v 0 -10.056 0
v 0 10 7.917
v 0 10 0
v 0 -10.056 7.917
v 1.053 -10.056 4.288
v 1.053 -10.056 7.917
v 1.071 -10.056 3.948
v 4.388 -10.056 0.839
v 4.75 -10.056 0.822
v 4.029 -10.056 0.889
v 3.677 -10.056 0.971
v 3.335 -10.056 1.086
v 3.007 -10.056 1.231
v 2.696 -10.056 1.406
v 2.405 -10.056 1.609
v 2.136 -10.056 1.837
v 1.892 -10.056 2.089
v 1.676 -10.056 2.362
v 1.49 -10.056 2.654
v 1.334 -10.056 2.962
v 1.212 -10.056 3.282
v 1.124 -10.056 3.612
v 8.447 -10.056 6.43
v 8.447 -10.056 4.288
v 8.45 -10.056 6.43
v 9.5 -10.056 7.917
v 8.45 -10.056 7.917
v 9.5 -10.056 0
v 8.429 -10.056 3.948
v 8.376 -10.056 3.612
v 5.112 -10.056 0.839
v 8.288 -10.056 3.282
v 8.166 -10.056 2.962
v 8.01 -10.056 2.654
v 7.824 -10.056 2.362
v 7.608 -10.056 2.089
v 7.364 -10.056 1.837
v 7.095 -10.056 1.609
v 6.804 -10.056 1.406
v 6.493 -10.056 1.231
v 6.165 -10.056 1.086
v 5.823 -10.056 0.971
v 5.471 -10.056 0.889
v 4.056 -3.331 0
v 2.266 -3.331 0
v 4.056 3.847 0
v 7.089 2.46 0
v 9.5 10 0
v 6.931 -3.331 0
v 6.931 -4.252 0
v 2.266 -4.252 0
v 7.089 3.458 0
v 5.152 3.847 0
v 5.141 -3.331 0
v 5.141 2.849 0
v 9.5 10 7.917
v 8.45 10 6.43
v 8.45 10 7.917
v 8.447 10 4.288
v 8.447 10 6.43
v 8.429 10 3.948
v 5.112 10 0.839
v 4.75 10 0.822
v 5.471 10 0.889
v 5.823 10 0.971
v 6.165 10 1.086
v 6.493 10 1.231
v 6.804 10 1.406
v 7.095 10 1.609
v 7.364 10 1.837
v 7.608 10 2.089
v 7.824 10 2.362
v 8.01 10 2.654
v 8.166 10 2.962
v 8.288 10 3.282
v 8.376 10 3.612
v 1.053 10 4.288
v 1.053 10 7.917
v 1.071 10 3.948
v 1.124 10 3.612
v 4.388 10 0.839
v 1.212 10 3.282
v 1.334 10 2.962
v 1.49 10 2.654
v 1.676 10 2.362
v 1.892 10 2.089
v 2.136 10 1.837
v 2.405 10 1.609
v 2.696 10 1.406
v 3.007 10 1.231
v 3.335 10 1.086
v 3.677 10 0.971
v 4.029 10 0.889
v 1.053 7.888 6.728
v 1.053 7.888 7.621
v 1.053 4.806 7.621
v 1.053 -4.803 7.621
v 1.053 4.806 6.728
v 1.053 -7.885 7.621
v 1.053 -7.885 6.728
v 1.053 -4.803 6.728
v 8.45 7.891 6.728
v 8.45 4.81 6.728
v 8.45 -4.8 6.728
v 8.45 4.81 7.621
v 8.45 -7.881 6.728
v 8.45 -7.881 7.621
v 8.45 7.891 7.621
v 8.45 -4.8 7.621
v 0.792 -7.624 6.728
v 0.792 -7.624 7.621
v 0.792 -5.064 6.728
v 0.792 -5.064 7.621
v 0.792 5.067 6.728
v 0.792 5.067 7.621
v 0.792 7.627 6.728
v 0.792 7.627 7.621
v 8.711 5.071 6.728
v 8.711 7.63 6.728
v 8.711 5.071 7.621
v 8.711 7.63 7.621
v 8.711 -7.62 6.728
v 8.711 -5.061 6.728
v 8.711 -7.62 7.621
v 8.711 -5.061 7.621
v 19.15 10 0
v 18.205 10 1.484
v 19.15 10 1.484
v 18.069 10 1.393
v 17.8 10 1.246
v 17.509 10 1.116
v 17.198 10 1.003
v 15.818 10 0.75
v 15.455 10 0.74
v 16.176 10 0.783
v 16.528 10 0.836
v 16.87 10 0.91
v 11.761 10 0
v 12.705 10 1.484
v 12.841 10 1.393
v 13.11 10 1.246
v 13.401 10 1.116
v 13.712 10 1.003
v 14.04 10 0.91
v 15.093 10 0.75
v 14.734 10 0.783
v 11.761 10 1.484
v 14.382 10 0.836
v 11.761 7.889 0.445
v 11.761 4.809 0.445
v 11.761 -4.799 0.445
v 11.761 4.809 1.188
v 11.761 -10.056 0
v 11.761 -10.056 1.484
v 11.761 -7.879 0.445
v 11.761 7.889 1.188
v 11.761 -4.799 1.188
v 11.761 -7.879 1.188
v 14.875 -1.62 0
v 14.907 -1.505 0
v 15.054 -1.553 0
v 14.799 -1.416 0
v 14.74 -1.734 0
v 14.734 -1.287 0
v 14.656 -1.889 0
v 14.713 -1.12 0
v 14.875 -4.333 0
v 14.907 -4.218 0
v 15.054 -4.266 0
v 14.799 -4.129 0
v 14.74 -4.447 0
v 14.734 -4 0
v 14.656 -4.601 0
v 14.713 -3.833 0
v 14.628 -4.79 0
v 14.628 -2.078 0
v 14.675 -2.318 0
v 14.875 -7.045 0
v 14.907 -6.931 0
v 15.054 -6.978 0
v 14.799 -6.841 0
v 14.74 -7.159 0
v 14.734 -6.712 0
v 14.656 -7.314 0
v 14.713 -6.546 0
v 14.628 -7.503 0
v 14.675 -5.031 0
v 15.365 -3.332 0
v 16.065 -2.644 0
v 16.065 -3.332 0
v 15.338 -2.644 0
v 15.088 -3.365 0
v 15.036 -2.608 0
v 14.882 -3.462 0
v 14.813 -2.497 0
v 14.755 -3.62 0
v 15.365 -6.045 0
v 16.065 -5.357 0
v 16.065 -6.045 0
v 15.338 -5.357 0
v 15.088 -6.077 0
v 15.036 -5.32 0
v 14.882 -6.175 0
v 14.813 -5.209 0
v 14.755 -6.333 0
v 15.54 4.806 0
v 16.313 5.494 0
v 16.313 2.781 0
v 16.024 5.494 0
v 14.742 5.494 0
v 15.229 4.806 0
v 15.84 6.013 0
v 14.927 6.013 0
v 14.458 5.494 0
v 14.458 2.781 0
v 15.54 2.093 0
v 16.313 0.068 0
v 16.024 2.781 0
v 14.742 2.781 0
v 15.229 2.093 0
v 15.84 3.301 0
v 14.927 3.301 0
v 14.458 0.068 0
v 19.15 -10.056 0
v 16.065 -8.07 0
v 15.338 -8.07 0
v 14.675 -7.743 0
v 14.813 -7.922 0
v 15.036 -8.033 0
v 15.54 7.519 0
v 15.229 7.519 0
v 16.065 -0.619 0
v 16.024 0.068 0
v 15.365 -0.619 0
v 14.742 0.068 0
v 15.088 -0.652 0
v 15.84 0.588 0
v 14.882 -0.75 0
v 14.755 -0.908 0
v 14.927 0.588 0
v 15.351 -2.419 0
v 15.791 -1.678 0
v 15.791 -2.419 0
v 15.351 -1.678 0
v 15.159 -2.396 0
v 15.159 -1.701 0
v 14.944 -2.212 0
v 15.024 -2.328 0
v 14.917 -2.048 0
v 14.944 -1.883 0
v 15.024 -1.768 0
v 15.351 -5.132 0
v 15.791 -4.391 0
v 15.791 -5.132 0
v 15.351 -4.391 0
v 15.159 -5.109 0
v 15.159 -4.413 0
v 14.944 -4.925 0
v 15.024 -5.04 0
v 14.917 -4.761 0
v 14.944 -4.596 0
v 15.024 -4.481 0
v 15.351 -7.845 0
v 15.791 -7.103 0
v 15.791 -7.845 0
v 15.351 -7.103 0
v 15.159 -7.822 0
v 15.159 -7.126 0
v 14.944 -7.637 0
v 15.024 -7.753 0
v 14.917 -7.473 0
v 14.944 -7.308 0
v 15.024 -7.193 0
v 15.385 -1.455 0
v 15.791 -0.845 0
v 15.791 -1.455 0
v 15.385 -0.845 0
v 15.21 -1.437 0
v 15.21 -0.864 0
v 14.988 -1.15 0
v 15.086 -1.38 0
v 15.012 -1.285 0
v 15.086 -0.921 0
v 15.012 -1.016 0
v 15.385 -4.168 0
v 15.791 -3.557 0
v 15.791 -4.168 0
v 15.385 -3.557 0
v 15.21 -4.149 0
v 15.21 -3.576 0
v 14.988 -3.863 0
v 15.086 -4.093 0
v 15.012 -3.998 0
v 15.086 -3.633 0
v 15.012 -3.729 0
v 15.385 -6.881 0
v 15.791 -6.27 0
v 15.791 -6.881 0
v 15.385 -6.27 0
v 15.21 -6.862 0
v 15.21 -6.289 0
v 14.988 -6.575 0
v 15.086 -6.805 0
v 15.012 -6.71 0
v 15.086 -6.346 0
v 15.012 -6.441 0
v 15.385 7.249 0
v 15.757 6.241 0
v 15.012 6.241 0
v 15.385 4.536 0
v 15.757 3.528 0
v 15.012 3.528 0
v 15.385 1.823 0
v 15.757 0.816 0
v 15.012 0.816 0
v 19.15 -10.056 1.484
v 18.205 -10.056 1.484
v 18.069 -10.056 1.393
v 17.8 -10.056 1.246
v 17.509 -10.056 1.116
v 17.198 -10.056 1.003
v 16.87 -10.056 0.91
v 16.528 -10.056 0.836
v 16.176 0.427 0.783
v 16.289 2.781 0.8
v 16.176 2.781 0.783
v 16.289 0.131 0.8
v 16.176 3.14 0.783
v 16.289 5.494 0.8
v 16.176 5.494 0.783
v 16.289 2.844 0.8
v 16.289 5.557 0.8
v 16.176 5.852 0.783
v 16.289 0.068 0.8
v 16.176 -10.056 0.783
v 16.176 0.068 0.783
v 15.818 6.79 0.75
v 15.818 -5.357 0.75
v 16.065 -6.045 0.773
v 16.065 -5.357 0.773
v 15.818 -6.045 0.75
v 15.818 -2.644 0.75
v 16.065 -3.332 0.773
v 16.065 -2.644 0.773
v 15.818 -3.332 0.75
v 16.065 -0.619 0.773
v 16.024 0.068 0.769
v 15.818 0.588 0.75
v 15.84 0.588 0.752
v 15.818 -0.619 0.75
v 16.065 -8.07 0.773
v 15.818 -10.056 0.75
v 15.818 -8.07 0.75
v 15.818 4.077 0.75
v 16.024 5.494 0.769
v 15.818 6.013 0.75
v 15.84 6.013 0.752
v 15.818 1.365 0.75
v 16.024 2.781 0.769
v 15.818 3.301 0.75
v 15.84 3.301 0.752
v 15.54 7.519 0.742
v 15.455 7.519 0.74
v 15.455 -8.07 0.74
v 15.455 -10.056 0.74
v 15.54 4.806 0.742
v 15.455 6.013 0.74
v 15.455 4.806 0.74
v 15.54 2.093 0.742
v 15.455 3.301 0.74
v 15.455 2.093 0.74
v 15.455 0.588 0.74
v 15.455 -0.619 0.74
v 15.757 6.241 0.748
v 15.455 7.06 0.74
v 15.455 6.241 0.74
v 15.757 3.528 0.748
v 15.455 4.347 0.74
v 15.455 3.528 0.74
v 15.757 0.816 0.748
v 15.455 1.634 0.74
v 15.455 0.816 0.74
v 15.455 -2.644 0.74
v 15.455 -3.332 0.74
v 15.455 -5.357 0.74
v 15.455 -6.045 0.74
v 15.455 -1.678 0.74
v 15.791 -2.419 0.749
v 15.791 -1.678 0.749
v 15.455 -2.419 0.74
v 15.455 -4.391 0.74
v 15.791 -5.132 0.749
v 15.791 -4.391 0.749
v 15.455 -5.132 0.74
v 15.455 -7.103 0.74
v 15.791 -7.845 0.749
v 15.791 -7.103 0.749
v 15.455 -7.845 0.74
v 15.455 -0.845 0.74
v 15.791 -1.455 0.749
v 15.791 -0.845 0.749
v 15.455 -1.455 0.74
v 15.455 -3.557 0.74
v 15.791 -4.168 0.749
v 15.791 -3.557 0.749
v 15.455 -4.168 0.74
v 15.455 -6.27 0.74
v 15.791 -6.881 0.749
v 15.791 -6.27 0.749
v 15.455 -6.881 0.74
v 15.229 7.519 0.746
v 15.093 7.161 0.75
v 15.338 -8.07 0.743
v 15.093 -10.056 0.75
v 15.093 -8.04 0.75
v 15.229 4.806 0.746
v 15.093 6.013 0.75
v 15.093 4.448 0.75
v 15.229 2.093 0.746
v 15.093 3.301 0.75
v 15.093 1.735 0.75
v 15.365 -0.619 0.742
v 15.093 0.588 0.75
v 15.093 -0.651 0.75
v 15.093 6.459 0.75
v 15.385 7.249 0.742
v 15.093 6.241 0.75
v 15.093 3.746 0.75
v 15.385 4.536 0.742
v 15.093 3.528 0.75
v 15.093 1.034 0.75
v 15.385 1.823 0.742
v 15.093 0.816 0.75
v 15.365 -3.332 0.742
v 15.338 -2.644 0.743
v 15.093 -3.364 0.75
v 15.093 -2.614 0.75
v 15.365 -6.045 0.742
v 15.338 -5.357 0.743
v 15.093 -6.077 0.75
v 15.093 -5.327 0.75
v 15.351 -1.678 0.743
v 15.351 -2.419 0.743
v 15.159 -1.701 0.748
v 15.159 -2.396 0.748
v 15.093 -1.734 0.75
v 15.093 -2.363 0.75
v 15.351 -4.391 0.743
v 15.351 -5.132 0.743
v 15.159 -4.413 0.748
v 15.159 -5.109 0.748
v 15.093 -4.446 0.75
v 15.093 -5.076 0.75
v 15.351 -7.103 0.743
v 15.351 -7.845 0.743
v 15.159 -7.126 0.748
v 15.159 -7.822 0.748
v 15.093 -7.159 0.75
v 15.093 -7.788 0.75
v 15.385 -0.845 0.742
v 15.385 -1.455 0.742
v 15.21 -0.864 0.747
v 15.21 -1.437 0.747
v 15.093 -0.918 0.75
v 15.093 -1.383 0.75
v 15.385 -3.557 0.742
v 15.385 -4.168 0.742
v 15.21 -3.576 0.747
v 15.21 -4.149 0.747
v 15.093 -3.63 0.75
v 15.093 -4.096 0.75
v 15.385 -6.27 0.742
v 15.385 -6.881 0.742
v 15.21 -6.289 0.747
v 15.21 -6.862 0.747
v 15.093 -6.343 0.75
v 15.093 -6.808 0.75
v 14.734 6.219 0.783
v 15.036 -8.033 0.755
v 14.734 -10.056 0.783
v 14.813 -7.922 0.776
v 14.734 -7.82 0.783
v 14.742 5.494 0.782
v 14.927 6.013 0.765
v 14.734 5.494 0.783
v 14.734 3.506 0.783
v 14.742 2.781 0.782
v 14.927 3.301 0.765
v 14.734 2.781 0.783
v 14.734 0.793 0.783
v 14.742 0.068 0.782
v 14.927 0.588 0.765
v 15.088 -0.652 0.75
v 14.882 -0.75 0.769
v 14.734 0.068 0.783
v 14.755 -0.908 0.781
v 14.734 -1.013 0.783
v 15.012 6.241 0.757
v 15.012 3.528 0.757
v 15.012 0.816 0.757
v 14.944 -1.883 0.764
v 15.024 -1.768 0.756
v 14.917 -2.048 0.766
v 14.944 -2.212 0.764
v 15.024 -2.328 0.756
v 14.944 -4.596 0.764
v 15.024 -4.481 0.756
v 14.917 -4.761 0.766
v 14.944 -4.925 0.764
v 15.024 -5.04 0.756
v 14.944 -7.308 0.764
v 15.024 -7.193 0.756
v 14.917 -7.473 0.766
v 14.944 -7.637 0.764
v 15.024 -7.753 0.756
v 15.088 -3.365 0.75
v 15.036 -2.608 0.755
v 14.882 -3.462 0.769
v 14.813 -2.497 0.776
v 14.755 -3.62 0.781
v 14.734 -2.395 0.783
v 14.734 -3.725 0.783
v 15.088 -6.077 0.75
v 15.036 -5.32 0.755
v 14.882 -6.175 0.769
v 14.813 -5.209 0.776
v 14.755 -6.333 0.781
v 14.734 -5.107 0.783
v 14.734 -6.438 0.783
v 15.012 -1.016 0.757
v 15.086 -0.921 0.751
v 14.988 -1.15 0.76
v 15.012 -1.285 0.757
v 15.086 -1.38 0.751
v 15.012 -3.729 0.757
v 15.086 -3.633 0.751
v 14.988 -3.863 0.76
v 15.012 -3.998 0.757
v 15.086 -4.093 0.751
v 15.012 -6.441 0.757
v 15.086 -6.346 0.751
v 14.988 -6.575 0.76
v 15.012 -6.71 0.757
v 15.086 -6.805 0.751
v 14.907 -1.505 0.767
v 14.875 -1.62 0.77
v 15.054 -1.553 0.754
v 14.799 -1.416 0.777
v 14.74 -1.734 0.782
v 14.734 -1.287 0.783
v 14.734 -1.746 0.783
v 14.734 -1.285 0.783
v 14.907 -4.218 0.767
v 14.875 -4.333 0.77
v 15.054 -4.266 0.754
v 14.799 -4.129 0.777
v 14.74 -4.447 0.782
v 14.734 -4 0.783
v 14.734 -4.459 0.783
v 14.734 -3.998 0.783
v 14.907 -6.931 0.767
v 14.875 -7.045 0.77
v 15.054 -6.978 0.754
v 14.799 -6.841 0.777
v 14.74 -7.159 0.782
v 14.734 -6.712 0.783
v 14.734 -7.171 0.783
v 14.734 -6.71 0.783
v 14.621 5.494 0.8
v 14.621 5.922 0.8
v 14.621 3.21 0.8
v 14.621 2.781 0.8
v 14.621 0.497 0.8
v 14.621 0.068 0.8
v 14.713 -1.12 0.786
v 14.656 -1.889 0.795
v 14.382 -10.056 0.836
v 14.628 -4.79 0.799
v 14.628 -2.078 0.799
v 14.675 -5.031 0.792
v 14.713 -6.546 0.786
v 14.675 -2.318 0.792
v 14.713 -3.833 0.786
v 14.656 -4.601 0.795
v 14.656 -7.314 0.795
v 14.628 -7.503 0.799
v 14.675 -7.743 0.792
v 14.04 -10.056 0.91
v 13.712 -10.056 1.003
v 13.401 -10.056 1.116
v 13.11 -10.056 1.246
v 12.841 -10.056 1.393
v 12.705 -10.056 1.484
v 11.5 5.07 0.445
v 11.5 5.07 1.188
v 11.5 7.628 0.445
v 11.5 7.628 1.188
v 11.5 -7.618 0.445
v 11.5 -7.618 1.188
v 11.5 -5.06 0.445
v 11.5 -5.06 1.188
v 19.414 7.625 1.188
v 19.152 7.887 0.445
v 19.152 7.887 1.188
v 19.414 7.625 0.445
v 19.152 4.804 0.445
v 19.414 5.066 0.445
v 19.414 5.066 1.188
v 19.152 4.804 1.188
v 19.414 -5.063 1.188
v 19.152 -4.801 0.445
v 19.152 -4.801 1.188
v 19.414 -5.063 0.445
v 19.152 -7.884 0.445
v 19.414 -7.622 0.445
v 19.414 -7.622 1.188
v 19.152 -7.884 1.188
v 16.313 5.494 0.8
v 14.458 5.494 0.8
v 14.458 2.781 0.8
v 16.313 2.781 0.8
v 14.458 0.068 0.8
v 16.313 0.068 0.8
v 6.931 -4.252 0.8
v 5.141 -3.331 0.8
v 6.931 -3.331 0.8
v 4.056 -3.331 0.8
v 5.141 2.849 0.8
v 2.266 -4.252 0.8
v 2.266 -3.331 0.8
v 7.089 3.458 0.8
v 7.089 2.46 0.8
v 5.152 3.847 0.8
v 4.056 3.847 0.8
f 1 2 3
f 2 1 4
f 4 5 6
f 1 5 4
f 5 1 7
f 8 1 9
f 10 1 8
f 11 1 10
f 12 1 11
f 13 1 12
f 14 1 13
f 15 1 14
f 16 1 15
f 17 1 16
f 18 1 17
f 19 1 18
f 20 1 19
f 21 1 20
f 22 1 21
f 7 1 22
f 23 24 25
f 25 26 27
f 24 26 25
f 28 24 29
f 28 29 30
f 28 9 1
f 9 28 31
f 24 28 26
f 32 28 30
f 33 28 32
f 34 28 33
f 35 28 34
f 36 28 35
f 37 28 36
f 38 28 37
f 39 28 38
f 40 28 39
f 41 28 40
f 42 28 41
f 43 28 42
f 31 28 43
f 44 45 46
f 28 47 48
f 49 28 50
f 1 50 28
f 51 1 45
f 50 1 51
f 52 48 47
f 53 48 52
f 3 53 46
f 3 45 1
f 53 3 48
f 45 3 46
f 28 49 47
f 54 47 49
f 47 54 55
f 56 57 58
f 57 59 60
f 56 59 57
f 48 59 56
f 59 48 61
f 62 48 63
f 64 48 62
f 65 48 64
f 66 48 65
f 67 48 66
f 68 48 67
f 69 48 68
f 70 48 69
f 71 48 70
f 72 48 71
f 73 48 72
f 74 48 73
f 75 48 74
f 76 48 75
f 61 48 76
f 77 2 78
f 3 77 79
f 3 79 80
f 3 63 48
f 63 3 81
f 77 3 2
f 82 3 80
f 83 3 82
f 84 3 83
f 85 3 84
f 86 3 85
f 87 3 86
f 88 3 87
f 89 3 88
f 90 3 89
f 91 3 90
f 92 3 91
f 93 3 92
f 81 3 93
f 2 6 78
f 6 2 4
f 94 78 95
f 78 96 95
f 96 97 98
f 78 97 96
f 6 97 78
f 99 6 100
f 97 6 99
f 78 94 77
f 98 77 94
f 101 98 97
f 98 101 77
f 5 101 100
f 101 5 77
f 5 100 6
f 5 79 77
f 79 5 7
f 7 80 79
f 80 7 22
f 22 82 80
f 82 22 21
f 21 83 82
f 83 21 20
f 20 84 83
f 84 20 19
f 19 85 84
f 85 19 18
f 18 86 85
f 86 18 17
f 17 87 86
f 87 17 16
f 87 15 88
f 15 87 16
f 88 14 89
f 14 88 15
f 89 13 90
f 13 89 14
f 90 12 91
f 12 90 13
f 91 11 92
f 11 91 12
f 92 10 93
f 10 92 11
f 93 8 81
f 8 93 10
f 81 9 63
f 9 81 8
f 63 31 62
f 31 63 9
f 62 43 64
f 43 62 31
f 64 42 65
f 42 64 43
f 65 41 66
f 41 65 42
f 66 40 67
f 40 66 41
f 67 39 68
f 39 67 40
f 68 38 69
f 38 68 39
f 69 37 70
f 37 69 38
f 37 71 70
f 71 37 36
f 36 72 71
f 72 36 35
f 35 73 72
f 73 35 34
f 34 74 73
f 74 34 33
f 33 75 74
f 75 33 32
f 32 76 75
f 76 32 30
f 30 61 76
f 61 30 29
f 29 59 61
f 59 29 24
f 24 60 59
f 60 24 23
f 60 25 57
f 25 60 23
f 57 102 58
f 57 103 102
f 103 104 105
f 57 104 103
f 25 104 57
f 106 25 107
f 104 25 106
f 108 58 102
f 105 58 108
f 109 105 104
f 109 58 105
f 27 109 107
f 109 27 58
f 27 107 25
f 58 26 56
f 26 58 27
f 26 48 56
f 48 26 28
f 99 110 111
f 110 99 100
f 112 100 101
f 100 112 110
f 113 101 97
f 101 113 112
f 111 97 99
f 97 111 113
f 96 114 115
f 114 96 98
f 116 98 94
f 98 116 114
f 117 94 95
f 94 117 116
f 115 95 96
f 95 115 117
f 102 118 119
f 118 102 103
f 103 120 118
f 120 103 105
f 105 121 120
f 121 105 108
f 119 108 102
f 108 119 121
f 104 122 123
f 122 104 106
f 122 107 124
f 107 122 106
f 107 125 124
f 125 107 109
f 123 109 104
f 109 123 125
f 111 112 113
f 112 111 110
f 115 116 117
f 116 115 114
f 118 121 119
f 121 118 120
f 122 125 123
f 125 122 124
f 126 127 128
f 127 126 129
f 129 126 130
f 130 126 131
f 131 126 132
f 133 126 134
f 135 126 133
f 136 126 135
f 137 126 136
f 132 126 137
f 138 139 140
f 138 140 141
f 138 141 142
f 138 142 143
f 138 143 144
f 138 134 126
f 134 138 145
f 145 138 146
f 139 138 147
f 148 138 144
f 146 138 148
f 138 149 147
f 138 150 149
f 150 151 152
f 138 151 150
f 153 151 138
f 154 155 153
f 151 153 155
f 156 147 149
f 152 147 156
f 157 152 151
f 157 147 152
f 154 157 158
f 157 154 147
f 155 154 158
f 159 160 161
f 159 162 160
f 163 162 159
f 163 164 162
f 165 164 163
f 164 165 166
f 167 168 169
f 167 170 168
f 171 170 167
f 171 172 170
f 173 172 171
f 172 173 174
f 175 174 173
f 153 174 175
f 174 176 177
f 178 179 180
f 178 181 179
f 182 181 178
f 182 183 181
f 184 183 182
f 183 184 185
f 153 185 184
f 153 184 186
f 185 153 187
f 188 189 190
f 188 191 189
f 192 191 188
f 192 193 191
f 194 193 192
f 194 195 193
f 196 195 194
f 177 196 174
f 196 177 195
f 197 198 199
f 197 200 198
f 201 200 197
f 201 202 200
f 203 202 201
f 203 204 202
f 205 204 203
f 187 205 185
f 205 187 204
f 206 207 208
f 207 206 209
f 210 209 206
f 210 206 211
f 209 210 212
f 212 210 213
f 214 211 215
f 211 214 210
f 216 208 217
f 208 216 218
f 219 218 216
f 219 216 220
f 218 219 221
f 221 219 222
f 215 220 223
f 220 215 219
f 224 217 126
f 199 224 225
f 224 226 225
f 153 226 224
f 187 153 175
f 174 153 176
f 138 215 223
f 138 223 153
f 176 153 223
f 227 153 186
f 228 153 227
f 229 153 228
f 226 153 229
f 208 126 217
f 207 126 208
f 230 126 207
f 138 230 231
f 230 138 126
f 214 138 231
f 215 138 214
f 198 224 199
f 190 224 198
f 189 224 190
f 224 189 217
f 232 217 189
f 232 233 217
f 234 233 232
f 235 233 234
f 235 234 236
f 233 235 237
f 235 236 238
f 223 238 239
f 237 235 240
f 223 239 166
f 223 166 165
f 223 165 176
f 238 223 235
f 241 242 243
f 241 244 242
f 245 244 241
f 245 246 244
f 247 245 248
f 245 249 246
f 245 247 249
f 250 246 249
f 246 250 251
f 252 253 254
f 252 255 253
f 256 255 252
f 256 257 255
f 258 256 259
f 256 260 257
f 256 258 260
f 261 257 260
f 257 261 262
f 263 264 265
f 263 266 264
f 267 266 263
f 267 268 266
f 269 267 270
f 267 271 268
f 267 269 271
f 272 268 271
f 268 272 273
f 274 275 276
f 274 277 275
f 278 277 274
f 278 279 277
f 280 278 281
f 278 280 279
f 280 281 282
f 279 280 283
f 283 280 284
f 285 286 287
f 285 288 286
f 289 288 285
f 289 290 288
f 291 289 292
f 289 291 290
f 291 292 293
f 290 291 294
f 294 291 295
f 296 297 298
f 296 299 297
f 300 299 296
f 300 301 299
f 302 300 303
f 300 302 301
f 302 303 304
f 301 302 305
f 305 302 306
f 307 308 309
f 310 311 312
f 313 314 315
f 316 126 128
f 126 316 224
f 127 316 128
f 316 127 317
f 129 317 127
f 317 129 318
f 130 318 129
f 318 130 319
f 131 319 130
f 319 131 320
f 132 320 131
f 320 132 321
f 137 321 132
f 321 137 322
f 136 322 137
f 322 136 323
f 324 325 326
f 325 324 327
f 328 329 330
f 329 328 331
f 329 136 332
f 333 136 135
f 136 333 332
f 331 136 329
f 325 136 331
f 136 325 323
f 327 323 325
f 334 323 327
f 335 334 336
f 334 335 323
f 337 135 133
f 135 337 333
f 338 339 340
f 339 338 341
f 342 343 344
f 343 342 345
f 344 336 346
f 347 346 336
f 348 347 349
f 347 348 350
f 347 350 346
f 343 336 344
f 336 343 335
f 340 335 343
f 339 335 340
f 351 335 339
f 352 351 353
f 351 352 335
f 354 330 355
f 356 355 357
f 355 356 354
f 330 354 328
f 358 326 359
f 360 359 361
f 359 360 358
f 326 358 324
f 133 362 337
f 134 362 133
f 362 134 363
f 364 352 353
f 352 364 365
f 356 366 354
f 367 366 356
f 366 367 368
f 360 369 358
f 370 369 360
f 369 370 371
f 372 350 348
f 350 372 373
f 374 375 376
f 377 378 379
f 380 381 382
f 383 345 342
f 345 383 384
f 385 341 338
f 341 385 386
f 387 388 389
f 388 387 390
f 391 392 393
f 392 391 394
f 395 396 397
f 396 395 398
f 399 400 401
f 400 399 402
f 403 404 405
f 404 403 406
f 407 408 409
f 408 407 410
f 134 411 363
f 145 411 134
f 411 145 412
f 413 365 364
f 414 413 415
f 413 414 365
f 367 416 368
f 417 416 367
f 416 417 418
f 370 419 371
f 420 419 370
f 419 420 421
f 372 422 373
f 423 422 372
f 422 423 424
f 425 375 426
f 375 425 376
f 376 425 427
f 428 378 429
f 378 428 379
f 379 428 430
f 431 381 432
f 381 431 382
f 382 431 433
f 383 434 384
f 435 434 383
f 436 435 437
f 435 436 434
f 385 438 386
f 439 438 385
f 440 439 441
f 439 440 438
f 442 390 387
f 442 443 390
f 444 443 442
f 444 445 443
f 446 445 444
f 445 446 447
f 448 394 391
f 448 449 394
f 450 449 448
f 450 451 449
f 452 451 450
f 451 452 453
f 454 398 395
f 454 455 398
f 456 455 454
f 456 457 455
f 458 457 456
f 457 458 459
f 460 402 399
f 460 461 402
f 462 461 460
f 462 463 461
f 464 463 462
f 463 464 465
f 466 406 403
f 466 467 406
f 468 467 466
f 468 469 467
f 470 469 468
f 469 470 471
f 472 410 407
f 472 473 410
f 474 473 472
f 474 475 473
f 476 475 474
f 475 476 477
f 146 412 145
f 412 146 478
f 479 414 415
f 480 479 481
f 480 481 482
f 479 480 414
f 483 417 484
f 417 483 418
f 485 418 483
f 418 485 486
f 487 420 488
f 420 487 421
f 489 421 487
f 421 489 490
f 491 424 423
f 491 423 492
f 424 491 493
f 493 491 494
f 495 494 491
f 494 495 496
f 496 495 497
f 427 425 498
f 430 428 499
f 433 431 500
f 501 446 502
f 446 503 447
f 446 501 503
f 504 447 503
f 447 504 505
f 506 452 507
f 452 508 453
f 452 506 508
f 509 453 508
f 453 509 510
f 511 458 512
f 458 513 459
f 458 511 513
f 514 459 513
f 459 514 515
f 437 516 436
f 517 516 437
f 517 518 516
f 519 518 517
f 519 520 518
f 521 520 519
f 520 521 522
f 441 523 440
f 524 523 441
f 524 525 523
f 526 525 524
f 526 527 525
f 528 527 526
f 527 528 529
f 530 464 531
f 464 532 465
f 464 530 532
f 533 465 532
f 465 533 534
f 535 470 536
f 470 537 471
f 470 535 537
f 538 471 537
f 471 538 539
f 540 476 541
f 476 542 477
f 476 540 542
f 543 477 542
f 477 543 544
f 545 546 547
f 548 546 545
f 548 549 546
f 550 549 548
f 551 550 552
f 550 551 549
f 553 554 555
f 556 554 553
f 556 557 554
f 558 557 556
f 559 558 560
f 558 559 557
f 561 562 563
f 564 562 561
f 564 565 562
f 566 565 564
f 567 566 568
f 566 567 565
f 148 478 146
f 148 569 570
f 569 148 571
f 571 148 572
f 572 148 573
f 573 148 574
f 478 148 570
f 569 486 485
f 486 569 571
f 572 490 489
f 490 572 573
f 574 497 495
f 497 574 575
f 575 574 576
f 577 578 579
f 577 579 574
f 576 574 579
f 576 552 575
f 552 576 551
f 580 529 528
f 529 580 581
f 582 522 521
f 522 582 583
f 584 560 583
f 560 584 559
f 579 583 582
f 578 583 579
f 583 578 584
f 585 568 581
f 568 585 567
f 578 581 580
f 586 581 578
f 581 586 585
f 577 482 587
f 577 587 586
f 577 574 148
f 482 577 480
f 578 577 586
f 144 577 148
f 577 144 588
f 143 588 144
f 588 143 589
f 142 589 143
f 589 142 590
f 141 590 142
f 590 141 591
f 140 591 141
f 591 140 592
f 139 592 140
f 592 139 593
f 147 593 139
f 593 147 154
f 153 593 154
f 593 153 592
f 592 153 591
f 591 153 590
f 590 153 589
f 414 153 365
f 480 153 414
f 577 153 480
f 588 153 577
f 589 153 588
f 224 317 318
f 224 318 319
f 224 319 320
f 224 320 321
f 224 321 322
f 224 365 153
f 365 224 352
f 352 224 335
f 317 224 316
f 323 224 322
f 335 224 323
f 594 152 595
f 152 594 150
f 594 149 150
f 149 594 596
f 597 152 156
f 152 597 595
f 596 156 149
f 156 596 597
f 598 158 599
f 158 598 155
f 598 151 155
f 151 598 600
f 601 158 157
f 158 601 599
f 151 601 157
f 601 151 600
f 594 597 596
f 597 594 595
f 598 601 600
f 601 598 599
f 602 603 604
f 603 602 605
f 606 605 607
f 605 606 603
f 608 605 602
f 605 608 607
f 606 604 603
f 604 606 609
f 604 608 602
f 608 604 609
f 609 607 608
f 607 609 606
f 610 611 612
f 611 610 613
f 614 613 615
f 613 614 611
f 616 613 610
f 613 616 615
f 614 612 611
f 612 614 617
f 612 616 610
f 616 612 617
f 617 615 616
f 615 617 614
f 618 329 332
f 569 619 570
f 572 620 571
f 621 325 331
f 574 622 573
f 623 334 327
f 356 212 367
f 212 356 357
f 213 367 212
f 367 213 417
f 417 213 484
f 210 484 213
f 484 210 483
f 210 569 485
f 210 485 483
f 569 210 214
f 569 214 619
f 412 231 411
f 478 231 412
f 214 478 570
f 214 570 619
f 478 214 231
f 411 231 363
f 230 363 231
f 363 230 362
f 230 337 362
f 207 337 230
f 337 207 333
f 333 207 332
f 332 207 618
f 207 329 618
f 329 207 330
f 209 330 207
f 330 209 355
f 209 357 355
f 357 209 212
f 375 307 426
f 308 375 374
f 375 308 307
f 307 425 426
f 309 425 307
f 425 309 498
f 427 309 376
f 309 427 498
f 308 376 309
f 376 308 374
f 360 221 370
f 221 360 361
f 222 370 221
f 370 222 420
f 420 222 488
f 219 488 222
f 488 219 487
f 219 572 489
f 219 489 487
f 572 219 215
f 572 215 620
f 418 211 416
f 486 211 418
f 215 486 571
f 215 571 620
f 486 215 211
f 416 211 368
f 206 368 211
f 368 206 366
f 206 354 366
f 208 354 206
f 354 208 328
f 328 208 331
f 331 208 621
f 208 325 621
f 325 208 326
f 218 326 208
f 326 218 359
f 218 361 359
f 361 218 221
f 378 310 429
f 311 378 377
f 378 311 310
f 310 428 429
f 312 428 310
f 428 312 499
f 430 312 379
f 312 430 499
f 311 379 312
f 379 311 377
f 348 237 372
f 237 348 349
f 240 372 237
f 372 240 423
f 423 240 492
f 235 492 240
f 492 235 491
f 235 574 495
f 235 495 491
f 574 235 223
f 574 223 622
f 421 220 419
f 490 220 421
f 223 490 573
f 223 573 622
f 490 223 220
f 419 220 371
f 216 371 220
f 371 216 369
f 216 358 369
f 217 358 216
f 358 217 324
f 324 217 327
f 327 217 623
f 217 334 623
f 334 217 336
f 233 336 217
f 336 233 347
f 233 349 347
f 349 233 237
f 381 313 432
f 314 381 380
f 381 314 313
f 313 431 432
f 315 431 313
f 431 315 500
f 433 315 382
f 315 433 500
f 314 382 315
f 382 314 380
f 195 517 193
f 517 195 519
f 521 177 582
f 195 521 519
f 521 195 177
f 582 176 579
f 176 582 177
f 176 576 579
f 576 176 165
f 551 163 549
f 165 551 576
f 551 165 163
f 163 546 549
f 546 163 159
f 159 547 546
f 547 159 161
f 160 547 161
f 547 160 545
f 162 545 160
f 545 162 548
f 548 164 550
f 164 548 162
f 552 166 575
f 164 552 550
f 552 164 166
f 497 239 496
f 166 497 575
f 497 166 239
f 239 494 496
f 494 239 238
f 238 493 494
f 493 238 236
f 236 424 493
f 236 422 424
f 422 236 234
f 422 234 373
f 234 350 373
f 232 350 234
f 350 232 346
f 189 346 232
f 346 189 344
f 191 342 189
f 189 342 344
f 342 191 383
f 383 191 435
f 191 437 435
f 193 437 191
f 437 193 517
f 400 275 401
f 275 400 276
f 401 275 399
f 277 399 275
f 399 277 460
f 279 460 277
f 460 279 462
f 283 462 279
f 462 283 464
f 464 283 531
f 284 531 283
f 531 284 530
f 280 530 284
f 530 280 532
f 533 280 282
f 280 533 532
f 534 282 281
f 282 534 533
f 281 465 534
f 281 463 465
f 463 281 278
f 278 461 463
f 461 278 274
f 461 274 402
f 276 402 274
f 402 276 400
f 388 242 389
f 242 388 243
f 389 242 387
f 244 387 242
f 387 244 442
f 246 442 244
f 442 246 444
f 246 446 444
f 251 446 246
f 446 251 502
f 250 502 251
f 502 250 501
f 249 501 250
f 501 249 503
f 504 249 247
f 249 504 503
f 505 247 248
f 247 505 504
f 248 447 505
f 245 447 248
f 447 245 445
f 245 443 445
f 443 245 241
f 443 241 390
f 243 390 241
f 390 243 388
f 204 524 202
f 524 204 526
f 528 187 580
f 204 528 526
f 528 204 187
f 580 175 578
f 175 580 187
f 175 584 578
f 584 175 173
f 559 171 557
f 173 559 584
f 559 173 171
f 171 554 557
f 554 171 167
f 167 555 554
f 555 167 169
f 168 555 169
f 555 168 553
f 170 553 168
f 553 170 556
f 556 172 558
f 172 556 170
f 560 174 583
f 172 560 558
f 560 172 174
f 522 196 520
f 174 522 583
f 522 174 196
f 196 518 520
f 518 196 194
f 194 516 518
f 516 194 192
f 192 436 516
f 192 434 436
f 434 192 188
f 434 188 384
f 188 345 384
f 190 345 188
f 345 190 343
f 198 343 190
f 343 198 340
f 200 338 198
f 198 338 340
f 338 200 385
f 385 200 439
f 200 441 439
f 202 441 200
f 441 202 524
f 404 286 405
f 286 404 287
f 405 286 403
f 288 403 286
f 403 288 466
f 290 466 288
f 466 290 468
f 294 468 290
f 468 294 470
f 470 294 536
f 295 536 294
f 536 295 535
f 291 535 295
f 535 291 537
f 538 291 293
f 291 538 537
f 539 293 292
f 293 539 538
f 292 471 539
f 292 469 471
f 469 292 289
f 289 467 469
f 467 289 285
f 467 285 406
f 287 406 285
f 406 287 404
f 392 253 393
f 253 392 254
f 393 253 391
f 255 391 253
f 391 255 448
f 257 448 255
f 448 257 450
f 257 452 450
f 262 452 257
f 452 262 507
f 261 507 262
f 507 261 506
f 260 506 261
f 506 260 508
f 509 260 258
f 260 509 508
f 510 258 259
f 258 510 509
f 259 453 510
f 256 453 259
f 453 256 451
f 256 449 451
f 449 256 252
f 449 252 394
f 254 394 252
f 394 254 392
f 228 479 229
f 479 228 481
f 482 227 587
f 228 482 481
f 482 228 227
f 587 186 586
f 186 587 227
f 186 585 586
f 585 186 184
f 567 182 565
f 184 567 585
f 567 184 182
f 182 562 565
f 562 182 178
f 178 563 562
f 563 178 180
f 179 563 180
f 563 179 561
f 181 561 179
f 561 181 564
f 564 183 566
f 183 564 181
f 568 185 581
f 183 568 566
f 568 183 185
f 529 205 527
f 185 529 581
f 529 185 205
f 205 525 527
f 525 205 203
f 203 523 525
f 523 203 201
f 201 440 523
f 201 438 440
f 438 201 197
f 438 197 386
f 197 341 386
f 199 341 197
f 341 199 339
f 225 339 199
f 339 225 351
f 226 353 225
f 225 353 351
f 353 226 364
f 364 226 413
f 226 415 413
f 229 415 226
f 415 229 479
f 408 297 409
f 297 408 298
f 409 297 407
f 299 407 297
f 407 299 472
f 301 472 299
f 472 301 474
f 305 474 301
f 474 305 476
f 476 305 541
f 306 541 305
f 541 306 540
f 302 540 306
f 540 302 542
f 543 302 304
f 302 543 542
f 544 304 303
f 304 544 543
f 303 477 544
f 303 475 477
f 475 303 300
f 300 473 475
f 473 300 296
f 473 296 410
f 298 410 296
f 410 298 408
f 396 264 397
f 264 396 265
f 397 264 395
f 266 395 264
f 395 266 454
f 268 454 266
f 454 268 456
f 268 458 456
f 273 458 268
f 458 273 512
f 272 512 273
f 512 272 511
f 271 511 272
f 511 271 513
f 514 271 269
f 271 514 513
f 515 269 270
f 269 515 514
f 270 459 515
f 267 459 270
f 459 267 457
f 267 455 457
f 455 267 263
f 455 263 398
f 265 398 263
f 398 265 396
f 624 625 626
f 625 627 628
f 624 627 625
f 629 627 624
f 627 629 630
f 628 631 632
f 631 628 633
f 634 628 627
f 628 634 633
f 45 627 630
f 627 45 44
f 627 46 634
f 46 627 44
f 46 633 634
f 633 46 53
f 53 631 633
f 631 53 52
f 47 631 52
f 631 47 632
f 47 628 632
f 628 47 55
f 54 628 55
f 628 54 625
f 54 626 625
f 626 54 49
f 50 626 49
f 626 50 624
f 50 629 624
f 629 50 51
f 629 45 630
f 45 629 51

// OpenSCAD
// ___________________________________________________________________________________________________________//
// Cabel Label.                                                                                               //
// A small customisable tag made for the ends of chargers or network cables to allow for permanent labelling. //
// Can be glued for extra security.                                                                           //
// ___________________________________________________________________________________________________________//

/* [Text] */
hatchTextIn = "AAABBB"; // Hatch text
bottomTextIn = "1"; // Bottom text

font = "Ubuntu"; //[Advent Pro,Alegreya Sans,Amaranth,Arimo,Arvo,Asap,Asul,Bangers,Basic,Bowlby One SC,Bubblegum Sans,Cabin Condensed,Carter One,Electrolize,Encode Sans Compressed,Exo 2,Federo,Fjord One,Geo,Graduate,Helvetica,Happy Monkey,Hind,Karma,Lemon One,Lilita One,Mako,McLaren,Merienda One,Nova Square,Nunito,Oswald,Oxygen,Permanent Marker,Racing Sans One,Roboto,Share,Source Sans Pro,Teko,Terminal Dosis,Ubuntu,Voces,Wallpoet]

/* [Text Size] */
hatchTextSize = 2; //[0.1:0.01:30.0]
bottomTextSize = 8; //[0.1:0.01:30.0]
hatchTextSpacing = 1; //[0.01:0.01:10.0]

/* [Text Positioning] */
hatchTextNudgeX = -14.5; //[-20.0:0.01:20.0]
hatchTextNudgeY = -0.3; //[-20.0:0.01:20.0]
bottomTextNudgeX = -2.5; //[-20.0:0.01:20.0]
bottomTextNudgeY = -0.3; //[-20.0:0.01:20.0]
textIndent = -0.8; //[-2.0:0.01:1.0]

/* [Scale] */
length = 1; //[0.01:0.001:2.0]
width = 1; //[0.01:0.001:2.0]

/* [Hidden] */
bottomText = str(bottomTextIn); // Bottom text string
hatchText = str(hatchTextIn); // Hatch text string

cablelabelPoints = [
	[0, -10.056, 0],
	[0, 10, 0],
	[0, 10, 7.917],
	[0, -10.056, 7.917],
	[9.5, 10, 7.917],
	[9.5, -10.056, 0],
	[9.5, -10.056, 7.917],
	[9.5, 10, 0],
	[1.071, 10, 3.948],
	[1.053, 10, 4.288],
	[0.792, -5.064, 7.621],
	[0.792, -7.624, 7.621],
	[1.053, -7.885, 7.621],
	[1.053, -4.803, 7.621],
	[1.053, -4.803, 6.728],
	[0.792, -5.064, 6.728],
	[11.761, 10, 0],
	[13.401, 10, 1.116],
	[13.11, 10, 1.246],
	[12.7048, 10, 1.484],
	[12.841, 10, 1.393],
	[1.053, 7.888, 6.728],
	[0.792, 7.627, 6.728],
	[0.792, 7.627, 7.621],
	[0.792, -7.624, 6.728],
	[1.053, -7.885, 6.728],
	[1.053, 4.806, 6.728],
	[0.792, 5.067, 6.728],
	[0.792, 5.067, 7.621],
	[8.45, -10.056, 7.917],
	[8.45, 10, 7.917],
	[1.053, 10, 7.917],
	[1.053, -10.056, 7.917],
	[11.5, 5.0697, 0.445],
	[11.5, 7.628, 0.445],
	[11.5, 7.628, 1.188],
	[11.5, 5.0697, 1.188],
	[11.5, -7.6183, 0.445],
	[11.5, -5.0597, 0.445],
	[11.5, -5.0597, 1.188],
	[11.5, -7.6183, 1.188],
	[18.2052, 10, 1.484],
	[19.15, 10, 0],
	[19.15, 10, 1.484],
	[19.414, 7.6247, 0.445],
	[19.414, 5.0663, 0.445],
	[19.414, 5.0663, 1.188],
	[19.414, 7.6247, 1.188],
	[18.069, 10, 1.393],
	[19.414, -5.0633, 0.445],
	[19.414, -7.6217, 0.445],
	[19.414, -7.6217, 1.188],
	[19.414, -5.0633, 1.188],
	[17.8, 10, 1.246],
	[17.509, 10, 1.116],
	[17.198, 10, 1.003],
	[2.696, -10.056, 1.406],
	[2.405, -10.056, 1.609],
	[16.87, 10, 0.91],
	[2.136, -10.056, 1.837],
	[3.335, -10.056, 1.086],
	[3.007, -10.056, 1.231],
	[15.818, 10, 0.75],
	[15.455, 10, 0.74],
	[1.892, -10.056, 2.089],
	[1.676, -10.056, 2.362],
	[1.49, -10.056, 2.654],
	[1.334, -10.056, 2.962],
	[1.212, -10.056, 3.282],
	[1.124, -10.056, 3.612],
	[1.071, -10.056, 3.948],
	[1.053, -10.056, 4.288],
	[5.823, -10.056, 0.971],
	[5.471, -10.056, 0.889],
	[5.112, -10.056, 0.839],
	[4.75, -10.056, 0.822],
	[4.388, -10.056, 0.839],
	[4.029, -10.056, 0.889],
	[7.608, -10.056, 2.089],
	[7.364, -10.056, 1.837],
	[6.165, -10.056, 1.086],
	[6.804, -10.056, 1.406],
	[6.493, -10.056, 1.231],
	[8.429, -10.056, 3.948],
	[8.376, -10.056, 3.612],
	[8.288, -10.056, 3.282],
	[8.166, -10.056, 2.962],
	[8.01, -10.056, 2.654],
	[7.824, -10.056, 2.362],
	[7.095, -10.056, 1.609],
	[8.447, -10.056, 4.288],
	[8.447, -10.056, 6.43],
	[8.45, -10.056, 6.43],
	[17.8, -10.056, 1.246],
	[18.069, -10.056, 1.393],
	[8.288, 10, 3.282],
	[8.376, 10, 3.612],
	[3.677, -10.056, 0.971],
	[19.15, -10.056, 1.484],
	[18.2052, -10.056, 1.484],
	[15.455, -10.056, 0.74],
	[15.818, -10.056, 0.75],
	[15.093, 10, 0.75],
	[19.15, -10.056, 0],
	[12.7048, -10.056, 1.484],
	[11.761, 10, 1.484],
	[14.04, -10.056, 0.91],
	[14.04, 10, 0.91],
	[14.382, -10.056, 0.835999],
	[13.712, -10.056, 1.003],
	[4.029, 10, 0.889],
	[3.677, 10, 0.971],
	[8.447, 10, 6.43],
	[8.447, 10, 4.288],
	[3.335, 10, 1.086],
	[12.841, -10.056, 1.393],
	[13.11, -10.056, 1.246],
	[8.45, 10, 6.43],
	[3.007, 10, 1.231],
	[2.696, 10, 1.406],
	[17.509, -10.056, 1.116],
	[2.405, 10, 1.609],
	[11.761, -10.056, 0],
	[17.198, -10.056, 1.003],
	[16.87, -10.056, 0.91],
	[16.528, 10, 0.835999],
	[2.136, 10, 1.837],
	[19.152, 4.80416, 1.188],
	[19.152, 7.88684, 1.188],
	[1.676, 10, 2.362],
	[1.892, 10, 2.089],
	[19.152, -7.88384, 1.188],
	[19.152, -4.80116, 1.188],
	[16.176, 10, 0.783],
	[16.176, -10.056, 0.783],
	[1.334, 10, 2.962],
	[1.49, 10, 2.654],
	[19.152, 7.88684, 0.445],
	[19.152, 4.80416, 0.445],
	[19.152, -4.80116, 0.445],
	[19.152, -7.88384, 0.445],
	[1.212, 10, 3.282],
	[8.45, 4.81, 7.621],
	[8.45, 7.891, 7.621],
	[8.45, -4.8, 7.621],
	[8.45, -7.88116, 7.621],
	[15.093, -10.056, 0.75],
	[1.124, 10, 3.612],
	[14.734, -10.056, 0.783],
	[8.01, 10, 2.654],
	[7.824, 10, 2.362],
	[14.382, 10, 0.835999],
	[13.712, 10, 1.003],
	[11.761, 4.80884, 1.188],
	[11.761, 7.889, 1.188],
	[11.761, -4.79884, 1.188],
	[11.761, -10.056, 1.484],
	[11.761, -7.87916, 1.188],
	[11.761, -7.87916, 0.445],
	[13.401, -10.056, 1.116],
	[8.45, 4.81, 6.728],
	[7.608, 10, 2.089],
	[7.364, 10, 1.837],
	[7.095, 10, 1.609],
	[6.804, 10, 1.406],
	[6.493, 10, 1.231],
	[6.165, 10, 1.086],
	[5.823, 10, 0.971],
	[8.45, 7.891, 6.728],
	[5.471, 10, 0.889],
	[5.112, 10, 0.839],
	[16.528, -10.056, 0.835999],
	[4.388, 10, 0.839],
	[4.75, 10, 0.822],
	[8.45, -7.88116, 6.728],
	[8.429, 10, 3.948],
	[14.734, 10, 0.783],
	[8.45, -4.8, 6.728],
	[8.166, 10, 2.962],
	[8.711, 7.63, 7.621],
	[8.711, 5.071, 6.728],
	[8.711, 5.071, 7.621],
	[8.711, -5.061, 7.621],
	[8.711, -5.061, 6.728],
	[8.711, -7.6203, 7.621],
	[8.711, -7.6203, 6.728],
	[8.711, 7.63, 6.728],
	[1.053, 7.888, 7.621],
	[1.053, 4.806, 7.621],
	[11.761, -4.79884, 0.445],
	[11.761, 4.80884, 0.445],
	[11.761, 7.889, 0.445],
];

cablelabelFaces = [
	[0, 2, 3],
	[1, 2, 0],
	[6, 5, 92],
	[92, 5, 90],
	[0, 64, 59],
	[0, 61, 60],
	[90, 5, 83],
	[0, 59, 57],
	[83, 5, 84],
	[84, 5, 85],
	[85, 5, 86],
	[86, 5, 87],
	[87, 5, 88],
	[88, 5, 78],
	[78, 5, 79],
	[79, 5, 89],
	[89, 5, 81],
	[81, 5, 82],
	[82, 5, 80],
	[0, 77, 76],
	[80, 5, 72],
	[72, 5, 73],
	[73, 5, 0],
	[74, 73, 0],
	[0, 97, 77],
	[0, 60, 97],
	[0, 56, 61],
	[0, 75, 74],
	[0, 76, 75],
	[57, 56, 0],
	[92, 90, 91],
	[64, 0, 65],
	[65, 0, 66],
	[66, 0, 67],
	[67, 0, 68],
	[68, 0, 69],
	[69, 0, 70],
	[70, 0, 71],
	[71, 0, 32],
	[32, 0, 3],
	[6, 92, 29],
	[0, 7, 1],
	[5, 7, 0],
	[1, 31, 2],
	[9, 31, 1],
	[8, 9, 1],
	[1, 147, 8],
	[1, 141, 147],
	[1, 135, 141],
	[1, 136, 135],
	[1, 129, 136],
	[1, 130, 129],
	[1, 126, 130],
	[1, 121, 126],
	[1, 119, 121],
	[1, 118, 119],
	[1, 114, 118],
	[1, 111, 114],
	[1, 110, 111],
	[1, 172, 110],
	[1, 173, 172],
	[1, 170, 173],
	[1, 169, 170],
	[1, 7, 169],
	[169, 7, 167],
	[167, 7, 166],
	[166, 7, 165],
	[165, 7, 164],
	[164, 7, 163],
	[163, 7, 162],
	[162, 7, 161],
	[161, 7, 150],
	[150, 7, 149],
	[149, 7, 178],
	[178, 7, 95],
	[96, 4, 175],
	[117, 112, 113],
	[175, 4, 113],
	[4, 30, 117],
	[113, 4, 117],
	[7, 4, 96],
	[95, 7, 96],
	[31, 32, 3],
	[31, 3, 2],
	[31, 9, 21],
	[25, 71, 32],
	[31, 12, 32],
	[12, 25, 32],
	[31, 13, 12],
	[31, 187, 188],
	[14, 71, 25],
	[26, 9, 71],
	[31, 188, 13],
	[31, 21, 187],
	[21, 9, 26],
	[188, 14, 13],
	[71, 14, 26],
	[14, 188, 26],
	[8, 70, 71],
	[8, 71, 9],
	[147, 69, 70],
	[147, 70, 8],
	[141, 68, 69],
	[141, 69, 147],
	[135, 67, 68],
	[135, 68, 141],
	[136, 66, 67],
	[136, 67, 135],
	[129, 65, 66],
	[129, 66, 136],
	[130, 64, 65],
	[130, 65, 129],
	[126, 59, 64],
	[126, 64, 130],
	[121, 57, 59],
	[121, 59, 126],
	[119, 56, 57],
	[119, 57, 121],
	[118, 61, 56],
	[118, 56, 119],
	[114, 60, 61],
	[114, 61, 118],
	[111, 97, 60],
	[111, 60, 114],
	[110, 77, 97],
	[110, 97, 111],
	[172, 76, 77],
	[172, 77, 110],
	[173, 75, 76],
	[173, 76, 172],
	[170, 74, 75],
	[170, 75, 173],
	[169, 73, 74],
	[169, 74, 170],
	[167, 72, 73],
	[167, 73, 169],
	[166, 80, 72],
	[166, 72, 167],
	[165, 82, 80],
	[165, 80, 166],
	[164, 81, 82],
	[164, 82, 165],
	[163, 89, 81],
	[163, 81, 164],
	[162, 79, 89],
	[162, 89, 163],
	[79, 161, 78],
	[162, 161, 79],
	[78, 150, 88],
	[161, 150, 78],
	[88, 149, 87],
	[150, 149, 88],
	[87, 178, 86],
	[149, 178, 87],
	[86, 95, 85],
	[178, 95, 86],
	[85, 96, 84],
	[95, 96, 85],
	[84, 175, 83],
	[96, 175, 84],
	[83, 113, 90],
	[175, 113, 83],
	[90, 112, 91],
	[113, 112, 90],
	[117, 92, 91],
	[117, 91, 112],
	[117, 30, 168],
	[174, 92, 177],
	[117, 160, 92],
	[117, 168, 160],
	[168, 30, 143],
	[142, 30, 29],
	[92, 174, 29],
	[160, 177, 92],
	[144, 142, 29],
	[145, 144, 29],
	[174, 145, 29],
	[177, 142, 144],
	[142, 177, 160],
	[143, 30, 142],
	[4, 6, 29],
	[4, 29, 30],
	[4, 7, 5],
	[4, 5, 6],
	[12, 11, 24],
	[12, 24, 25],
	[14, 25, 24],
	[14, 24, 15],
	[13, 14, 15],
	[13, 15, 10],
	[11, 13, 10],
	[12, 13, 11],
	[27, 188, 28],
	[26, 188, 27],
	[21, 26, 27],
	[21, 27, 22],
	[187, 21, 22],
	[187, 22, 23],
	[28, 187, 23],
	[188, 187, 28],
	[186, 180, 160],
	[186, 160, 168],
	[160, 181, 142],
	[180, 181, 160],
	[142, 179, 143],
	[181, 179, 142],
	[179, 186, 168],
	[179, 168, 143],
	[183, 185, 174],
	[183, 174, 177],
	[174, 184, 145],
	[185, 184, 174],
	[145, 182, 144],
	[184, 182, 145],
	[182, 183, 177],
	[182, 177, 144],
	[10, 15, 24],
	[10, 24, 11],
	[23, 22, 27],
	[23, 27, 28],
	[180, 179, 181],
	[186, 179, 180],
	[185, 182, 184],
	[183, 182, 185],
	[16, 19, 105],
	[20, 19, 16],
	[18, 20, 16],
	[16, 17, 18],
	[16, 152, 17],
	[16, 107, 152],
	[16, 151, 107],
	[16, 176, 151],
	[16, 102, 176],
	[16, 63, 102],
	[16, 62, 63],
	[16, 133, 62],
	[16, 125, 133],
	[16, 42, 125],
	[58, 43, 55],
	[55, 43, 54],
	[54, 43, 53],
	[43, 41, 48],
	[53, 43, 48],
	[42, 43, 58],
	[125, 42, 58],
	[16, 105, 191],
	[189, 153, 155],
	[16, 190, 122],
	[16, 191, 190],
	[191, 105, 154],
	[153, 105, 156],
	[122, 153, 189],
	[122, 158, 156],
	[122, 189, 158],
	[155, 153, 156],
	[157, 155, 156],
	[158, 157, 156],
	[153, 122, 190],
	[154, 105, 153],
	[122, 42, 16],
	[103, 42, 122],
	[43, 42, 103],
	[43, 103, 98],
	[43, 98, 99],
	[43, 99, 41],
	[41, 99, 94],
	[41, 94, 48],
	[48, 94, 93],
	[48, 93, 53],
	[53, 93, 120],
	[53, 120, 54],
	[54, 120, 123],
	[54, 123, 55],
	[55, 123, 124],
	[55, 124, 58],
	[58, 124, 171],
	[58, 171, 125],
	[125, 171, 134],
	[125, 134, 133],
	[133, 134, 101],
	[133, 101, 62],
	[62, 101, 100],
	[62, 100, 63],
	[63, 100, 146],
	[63, 146, 102],
	[102, 146, 148],
	[102, 148, 176],
	[176, 148, 108],
	[176, 108, 151],
	[151, 108, 106],
	[151, 106, 107],
	[107, 106, 109],
	[107, 109, 152],
	[152, 109, 159],
	[152, 159, 17],
	[17, 159, 116],
	[17, 116, 18],
	[18, 116, 115],
	[18, 115, 20],
	[20, 115, 104],
	[20, 104, 19],
	[19, 104, 156],
	[19, 156, 105],
	[98, 103, 120],
	[122, 101, 134],
	[98, 94, 99],
	[98, 93, 94],
	[122, 148, 146],
	[120, 103, 123],
	[123, 103, 124],
	[122, 100, 101],
	[124, 103, 171],
	[171, 103, 122],
	[122, 146, 100],
	[134, 171, 122],
	[148, 122, 108],
	[108, 122, 106],
	[106, 122, 109],
	[109, 122, 159],
	[159, 122, 116],
	[116, 122, 115],
	[115, 122, 104],
	[104, 122, 156],
	[98, 120, 93],
	[153, 190, 33],
	[153, 33, 36],
	[33, 191, 34],
	[190, 191, 33],
	[154, 153, 36],
	[154, 36, 35],
	[34, 154, 35],
	[191, 154, 34],
	[157, 158, 37],
	[157, 37, 40],
	[37, 189, 38],
	[158, 189, 37],
	[155, 157, 40],
	[155, 40, 39],
	[38, 155, 39],
	[189, 155, 38],
	[33, 35, 36],
	[34, 35, 33],
	[37, 39, 40],
	[38, 39, 37],
	[47, 128, 137],
	[47, 137, 44],
	[138, 44, 137],
	[45, 44, 138],
	[47, 44, 45],
	[47, 45, 46],
	[138, 128, 127],
	[137, 128, 138],
	[47, 46, 127],
	[47, 127, 128],
	[46, 45, 138],
	[46, 138, 127],
	[52, 132, 139],
	[52, 139, 49],
	[140, 49, 139],
	[50, 49, 140],
	[52, 49, 50],
	[52, 50, 51],
	[140, 132, 131],
	[139, 132, 140],
	[52, 51, 131],
	[52, 131, 132],
	[51, 50, 140],
	[51, 140, 131],
];

module cablelabel() {
 	polyhedron(points = cablelabelPoints, faces = cablelabelFaces);
}

difference() {
    scale([width, length, width])
    cablelabel();
    rotate([0, 180, 0])
    translate([hatchTextNudgeX,hatchTextNudgeY,textIndent])
    linear_extrude(height=3)
    text(hatchText, size=hatchTextSize, font = font, halign = "center", valign = "center", spacing = hatchTextSpacing, direction = "ttb");
    rotate([0, 180, 0])
    translate([bottomTextNudgeX,bottomTextNudgeY,textIndent])
    linear_extrude(height=3)
    text(bottomText, size=bottomTextSize, font = font, halign = "center", valign = "center", direction = "ttb");
}

// preview[view:north, tilt:bottom]
